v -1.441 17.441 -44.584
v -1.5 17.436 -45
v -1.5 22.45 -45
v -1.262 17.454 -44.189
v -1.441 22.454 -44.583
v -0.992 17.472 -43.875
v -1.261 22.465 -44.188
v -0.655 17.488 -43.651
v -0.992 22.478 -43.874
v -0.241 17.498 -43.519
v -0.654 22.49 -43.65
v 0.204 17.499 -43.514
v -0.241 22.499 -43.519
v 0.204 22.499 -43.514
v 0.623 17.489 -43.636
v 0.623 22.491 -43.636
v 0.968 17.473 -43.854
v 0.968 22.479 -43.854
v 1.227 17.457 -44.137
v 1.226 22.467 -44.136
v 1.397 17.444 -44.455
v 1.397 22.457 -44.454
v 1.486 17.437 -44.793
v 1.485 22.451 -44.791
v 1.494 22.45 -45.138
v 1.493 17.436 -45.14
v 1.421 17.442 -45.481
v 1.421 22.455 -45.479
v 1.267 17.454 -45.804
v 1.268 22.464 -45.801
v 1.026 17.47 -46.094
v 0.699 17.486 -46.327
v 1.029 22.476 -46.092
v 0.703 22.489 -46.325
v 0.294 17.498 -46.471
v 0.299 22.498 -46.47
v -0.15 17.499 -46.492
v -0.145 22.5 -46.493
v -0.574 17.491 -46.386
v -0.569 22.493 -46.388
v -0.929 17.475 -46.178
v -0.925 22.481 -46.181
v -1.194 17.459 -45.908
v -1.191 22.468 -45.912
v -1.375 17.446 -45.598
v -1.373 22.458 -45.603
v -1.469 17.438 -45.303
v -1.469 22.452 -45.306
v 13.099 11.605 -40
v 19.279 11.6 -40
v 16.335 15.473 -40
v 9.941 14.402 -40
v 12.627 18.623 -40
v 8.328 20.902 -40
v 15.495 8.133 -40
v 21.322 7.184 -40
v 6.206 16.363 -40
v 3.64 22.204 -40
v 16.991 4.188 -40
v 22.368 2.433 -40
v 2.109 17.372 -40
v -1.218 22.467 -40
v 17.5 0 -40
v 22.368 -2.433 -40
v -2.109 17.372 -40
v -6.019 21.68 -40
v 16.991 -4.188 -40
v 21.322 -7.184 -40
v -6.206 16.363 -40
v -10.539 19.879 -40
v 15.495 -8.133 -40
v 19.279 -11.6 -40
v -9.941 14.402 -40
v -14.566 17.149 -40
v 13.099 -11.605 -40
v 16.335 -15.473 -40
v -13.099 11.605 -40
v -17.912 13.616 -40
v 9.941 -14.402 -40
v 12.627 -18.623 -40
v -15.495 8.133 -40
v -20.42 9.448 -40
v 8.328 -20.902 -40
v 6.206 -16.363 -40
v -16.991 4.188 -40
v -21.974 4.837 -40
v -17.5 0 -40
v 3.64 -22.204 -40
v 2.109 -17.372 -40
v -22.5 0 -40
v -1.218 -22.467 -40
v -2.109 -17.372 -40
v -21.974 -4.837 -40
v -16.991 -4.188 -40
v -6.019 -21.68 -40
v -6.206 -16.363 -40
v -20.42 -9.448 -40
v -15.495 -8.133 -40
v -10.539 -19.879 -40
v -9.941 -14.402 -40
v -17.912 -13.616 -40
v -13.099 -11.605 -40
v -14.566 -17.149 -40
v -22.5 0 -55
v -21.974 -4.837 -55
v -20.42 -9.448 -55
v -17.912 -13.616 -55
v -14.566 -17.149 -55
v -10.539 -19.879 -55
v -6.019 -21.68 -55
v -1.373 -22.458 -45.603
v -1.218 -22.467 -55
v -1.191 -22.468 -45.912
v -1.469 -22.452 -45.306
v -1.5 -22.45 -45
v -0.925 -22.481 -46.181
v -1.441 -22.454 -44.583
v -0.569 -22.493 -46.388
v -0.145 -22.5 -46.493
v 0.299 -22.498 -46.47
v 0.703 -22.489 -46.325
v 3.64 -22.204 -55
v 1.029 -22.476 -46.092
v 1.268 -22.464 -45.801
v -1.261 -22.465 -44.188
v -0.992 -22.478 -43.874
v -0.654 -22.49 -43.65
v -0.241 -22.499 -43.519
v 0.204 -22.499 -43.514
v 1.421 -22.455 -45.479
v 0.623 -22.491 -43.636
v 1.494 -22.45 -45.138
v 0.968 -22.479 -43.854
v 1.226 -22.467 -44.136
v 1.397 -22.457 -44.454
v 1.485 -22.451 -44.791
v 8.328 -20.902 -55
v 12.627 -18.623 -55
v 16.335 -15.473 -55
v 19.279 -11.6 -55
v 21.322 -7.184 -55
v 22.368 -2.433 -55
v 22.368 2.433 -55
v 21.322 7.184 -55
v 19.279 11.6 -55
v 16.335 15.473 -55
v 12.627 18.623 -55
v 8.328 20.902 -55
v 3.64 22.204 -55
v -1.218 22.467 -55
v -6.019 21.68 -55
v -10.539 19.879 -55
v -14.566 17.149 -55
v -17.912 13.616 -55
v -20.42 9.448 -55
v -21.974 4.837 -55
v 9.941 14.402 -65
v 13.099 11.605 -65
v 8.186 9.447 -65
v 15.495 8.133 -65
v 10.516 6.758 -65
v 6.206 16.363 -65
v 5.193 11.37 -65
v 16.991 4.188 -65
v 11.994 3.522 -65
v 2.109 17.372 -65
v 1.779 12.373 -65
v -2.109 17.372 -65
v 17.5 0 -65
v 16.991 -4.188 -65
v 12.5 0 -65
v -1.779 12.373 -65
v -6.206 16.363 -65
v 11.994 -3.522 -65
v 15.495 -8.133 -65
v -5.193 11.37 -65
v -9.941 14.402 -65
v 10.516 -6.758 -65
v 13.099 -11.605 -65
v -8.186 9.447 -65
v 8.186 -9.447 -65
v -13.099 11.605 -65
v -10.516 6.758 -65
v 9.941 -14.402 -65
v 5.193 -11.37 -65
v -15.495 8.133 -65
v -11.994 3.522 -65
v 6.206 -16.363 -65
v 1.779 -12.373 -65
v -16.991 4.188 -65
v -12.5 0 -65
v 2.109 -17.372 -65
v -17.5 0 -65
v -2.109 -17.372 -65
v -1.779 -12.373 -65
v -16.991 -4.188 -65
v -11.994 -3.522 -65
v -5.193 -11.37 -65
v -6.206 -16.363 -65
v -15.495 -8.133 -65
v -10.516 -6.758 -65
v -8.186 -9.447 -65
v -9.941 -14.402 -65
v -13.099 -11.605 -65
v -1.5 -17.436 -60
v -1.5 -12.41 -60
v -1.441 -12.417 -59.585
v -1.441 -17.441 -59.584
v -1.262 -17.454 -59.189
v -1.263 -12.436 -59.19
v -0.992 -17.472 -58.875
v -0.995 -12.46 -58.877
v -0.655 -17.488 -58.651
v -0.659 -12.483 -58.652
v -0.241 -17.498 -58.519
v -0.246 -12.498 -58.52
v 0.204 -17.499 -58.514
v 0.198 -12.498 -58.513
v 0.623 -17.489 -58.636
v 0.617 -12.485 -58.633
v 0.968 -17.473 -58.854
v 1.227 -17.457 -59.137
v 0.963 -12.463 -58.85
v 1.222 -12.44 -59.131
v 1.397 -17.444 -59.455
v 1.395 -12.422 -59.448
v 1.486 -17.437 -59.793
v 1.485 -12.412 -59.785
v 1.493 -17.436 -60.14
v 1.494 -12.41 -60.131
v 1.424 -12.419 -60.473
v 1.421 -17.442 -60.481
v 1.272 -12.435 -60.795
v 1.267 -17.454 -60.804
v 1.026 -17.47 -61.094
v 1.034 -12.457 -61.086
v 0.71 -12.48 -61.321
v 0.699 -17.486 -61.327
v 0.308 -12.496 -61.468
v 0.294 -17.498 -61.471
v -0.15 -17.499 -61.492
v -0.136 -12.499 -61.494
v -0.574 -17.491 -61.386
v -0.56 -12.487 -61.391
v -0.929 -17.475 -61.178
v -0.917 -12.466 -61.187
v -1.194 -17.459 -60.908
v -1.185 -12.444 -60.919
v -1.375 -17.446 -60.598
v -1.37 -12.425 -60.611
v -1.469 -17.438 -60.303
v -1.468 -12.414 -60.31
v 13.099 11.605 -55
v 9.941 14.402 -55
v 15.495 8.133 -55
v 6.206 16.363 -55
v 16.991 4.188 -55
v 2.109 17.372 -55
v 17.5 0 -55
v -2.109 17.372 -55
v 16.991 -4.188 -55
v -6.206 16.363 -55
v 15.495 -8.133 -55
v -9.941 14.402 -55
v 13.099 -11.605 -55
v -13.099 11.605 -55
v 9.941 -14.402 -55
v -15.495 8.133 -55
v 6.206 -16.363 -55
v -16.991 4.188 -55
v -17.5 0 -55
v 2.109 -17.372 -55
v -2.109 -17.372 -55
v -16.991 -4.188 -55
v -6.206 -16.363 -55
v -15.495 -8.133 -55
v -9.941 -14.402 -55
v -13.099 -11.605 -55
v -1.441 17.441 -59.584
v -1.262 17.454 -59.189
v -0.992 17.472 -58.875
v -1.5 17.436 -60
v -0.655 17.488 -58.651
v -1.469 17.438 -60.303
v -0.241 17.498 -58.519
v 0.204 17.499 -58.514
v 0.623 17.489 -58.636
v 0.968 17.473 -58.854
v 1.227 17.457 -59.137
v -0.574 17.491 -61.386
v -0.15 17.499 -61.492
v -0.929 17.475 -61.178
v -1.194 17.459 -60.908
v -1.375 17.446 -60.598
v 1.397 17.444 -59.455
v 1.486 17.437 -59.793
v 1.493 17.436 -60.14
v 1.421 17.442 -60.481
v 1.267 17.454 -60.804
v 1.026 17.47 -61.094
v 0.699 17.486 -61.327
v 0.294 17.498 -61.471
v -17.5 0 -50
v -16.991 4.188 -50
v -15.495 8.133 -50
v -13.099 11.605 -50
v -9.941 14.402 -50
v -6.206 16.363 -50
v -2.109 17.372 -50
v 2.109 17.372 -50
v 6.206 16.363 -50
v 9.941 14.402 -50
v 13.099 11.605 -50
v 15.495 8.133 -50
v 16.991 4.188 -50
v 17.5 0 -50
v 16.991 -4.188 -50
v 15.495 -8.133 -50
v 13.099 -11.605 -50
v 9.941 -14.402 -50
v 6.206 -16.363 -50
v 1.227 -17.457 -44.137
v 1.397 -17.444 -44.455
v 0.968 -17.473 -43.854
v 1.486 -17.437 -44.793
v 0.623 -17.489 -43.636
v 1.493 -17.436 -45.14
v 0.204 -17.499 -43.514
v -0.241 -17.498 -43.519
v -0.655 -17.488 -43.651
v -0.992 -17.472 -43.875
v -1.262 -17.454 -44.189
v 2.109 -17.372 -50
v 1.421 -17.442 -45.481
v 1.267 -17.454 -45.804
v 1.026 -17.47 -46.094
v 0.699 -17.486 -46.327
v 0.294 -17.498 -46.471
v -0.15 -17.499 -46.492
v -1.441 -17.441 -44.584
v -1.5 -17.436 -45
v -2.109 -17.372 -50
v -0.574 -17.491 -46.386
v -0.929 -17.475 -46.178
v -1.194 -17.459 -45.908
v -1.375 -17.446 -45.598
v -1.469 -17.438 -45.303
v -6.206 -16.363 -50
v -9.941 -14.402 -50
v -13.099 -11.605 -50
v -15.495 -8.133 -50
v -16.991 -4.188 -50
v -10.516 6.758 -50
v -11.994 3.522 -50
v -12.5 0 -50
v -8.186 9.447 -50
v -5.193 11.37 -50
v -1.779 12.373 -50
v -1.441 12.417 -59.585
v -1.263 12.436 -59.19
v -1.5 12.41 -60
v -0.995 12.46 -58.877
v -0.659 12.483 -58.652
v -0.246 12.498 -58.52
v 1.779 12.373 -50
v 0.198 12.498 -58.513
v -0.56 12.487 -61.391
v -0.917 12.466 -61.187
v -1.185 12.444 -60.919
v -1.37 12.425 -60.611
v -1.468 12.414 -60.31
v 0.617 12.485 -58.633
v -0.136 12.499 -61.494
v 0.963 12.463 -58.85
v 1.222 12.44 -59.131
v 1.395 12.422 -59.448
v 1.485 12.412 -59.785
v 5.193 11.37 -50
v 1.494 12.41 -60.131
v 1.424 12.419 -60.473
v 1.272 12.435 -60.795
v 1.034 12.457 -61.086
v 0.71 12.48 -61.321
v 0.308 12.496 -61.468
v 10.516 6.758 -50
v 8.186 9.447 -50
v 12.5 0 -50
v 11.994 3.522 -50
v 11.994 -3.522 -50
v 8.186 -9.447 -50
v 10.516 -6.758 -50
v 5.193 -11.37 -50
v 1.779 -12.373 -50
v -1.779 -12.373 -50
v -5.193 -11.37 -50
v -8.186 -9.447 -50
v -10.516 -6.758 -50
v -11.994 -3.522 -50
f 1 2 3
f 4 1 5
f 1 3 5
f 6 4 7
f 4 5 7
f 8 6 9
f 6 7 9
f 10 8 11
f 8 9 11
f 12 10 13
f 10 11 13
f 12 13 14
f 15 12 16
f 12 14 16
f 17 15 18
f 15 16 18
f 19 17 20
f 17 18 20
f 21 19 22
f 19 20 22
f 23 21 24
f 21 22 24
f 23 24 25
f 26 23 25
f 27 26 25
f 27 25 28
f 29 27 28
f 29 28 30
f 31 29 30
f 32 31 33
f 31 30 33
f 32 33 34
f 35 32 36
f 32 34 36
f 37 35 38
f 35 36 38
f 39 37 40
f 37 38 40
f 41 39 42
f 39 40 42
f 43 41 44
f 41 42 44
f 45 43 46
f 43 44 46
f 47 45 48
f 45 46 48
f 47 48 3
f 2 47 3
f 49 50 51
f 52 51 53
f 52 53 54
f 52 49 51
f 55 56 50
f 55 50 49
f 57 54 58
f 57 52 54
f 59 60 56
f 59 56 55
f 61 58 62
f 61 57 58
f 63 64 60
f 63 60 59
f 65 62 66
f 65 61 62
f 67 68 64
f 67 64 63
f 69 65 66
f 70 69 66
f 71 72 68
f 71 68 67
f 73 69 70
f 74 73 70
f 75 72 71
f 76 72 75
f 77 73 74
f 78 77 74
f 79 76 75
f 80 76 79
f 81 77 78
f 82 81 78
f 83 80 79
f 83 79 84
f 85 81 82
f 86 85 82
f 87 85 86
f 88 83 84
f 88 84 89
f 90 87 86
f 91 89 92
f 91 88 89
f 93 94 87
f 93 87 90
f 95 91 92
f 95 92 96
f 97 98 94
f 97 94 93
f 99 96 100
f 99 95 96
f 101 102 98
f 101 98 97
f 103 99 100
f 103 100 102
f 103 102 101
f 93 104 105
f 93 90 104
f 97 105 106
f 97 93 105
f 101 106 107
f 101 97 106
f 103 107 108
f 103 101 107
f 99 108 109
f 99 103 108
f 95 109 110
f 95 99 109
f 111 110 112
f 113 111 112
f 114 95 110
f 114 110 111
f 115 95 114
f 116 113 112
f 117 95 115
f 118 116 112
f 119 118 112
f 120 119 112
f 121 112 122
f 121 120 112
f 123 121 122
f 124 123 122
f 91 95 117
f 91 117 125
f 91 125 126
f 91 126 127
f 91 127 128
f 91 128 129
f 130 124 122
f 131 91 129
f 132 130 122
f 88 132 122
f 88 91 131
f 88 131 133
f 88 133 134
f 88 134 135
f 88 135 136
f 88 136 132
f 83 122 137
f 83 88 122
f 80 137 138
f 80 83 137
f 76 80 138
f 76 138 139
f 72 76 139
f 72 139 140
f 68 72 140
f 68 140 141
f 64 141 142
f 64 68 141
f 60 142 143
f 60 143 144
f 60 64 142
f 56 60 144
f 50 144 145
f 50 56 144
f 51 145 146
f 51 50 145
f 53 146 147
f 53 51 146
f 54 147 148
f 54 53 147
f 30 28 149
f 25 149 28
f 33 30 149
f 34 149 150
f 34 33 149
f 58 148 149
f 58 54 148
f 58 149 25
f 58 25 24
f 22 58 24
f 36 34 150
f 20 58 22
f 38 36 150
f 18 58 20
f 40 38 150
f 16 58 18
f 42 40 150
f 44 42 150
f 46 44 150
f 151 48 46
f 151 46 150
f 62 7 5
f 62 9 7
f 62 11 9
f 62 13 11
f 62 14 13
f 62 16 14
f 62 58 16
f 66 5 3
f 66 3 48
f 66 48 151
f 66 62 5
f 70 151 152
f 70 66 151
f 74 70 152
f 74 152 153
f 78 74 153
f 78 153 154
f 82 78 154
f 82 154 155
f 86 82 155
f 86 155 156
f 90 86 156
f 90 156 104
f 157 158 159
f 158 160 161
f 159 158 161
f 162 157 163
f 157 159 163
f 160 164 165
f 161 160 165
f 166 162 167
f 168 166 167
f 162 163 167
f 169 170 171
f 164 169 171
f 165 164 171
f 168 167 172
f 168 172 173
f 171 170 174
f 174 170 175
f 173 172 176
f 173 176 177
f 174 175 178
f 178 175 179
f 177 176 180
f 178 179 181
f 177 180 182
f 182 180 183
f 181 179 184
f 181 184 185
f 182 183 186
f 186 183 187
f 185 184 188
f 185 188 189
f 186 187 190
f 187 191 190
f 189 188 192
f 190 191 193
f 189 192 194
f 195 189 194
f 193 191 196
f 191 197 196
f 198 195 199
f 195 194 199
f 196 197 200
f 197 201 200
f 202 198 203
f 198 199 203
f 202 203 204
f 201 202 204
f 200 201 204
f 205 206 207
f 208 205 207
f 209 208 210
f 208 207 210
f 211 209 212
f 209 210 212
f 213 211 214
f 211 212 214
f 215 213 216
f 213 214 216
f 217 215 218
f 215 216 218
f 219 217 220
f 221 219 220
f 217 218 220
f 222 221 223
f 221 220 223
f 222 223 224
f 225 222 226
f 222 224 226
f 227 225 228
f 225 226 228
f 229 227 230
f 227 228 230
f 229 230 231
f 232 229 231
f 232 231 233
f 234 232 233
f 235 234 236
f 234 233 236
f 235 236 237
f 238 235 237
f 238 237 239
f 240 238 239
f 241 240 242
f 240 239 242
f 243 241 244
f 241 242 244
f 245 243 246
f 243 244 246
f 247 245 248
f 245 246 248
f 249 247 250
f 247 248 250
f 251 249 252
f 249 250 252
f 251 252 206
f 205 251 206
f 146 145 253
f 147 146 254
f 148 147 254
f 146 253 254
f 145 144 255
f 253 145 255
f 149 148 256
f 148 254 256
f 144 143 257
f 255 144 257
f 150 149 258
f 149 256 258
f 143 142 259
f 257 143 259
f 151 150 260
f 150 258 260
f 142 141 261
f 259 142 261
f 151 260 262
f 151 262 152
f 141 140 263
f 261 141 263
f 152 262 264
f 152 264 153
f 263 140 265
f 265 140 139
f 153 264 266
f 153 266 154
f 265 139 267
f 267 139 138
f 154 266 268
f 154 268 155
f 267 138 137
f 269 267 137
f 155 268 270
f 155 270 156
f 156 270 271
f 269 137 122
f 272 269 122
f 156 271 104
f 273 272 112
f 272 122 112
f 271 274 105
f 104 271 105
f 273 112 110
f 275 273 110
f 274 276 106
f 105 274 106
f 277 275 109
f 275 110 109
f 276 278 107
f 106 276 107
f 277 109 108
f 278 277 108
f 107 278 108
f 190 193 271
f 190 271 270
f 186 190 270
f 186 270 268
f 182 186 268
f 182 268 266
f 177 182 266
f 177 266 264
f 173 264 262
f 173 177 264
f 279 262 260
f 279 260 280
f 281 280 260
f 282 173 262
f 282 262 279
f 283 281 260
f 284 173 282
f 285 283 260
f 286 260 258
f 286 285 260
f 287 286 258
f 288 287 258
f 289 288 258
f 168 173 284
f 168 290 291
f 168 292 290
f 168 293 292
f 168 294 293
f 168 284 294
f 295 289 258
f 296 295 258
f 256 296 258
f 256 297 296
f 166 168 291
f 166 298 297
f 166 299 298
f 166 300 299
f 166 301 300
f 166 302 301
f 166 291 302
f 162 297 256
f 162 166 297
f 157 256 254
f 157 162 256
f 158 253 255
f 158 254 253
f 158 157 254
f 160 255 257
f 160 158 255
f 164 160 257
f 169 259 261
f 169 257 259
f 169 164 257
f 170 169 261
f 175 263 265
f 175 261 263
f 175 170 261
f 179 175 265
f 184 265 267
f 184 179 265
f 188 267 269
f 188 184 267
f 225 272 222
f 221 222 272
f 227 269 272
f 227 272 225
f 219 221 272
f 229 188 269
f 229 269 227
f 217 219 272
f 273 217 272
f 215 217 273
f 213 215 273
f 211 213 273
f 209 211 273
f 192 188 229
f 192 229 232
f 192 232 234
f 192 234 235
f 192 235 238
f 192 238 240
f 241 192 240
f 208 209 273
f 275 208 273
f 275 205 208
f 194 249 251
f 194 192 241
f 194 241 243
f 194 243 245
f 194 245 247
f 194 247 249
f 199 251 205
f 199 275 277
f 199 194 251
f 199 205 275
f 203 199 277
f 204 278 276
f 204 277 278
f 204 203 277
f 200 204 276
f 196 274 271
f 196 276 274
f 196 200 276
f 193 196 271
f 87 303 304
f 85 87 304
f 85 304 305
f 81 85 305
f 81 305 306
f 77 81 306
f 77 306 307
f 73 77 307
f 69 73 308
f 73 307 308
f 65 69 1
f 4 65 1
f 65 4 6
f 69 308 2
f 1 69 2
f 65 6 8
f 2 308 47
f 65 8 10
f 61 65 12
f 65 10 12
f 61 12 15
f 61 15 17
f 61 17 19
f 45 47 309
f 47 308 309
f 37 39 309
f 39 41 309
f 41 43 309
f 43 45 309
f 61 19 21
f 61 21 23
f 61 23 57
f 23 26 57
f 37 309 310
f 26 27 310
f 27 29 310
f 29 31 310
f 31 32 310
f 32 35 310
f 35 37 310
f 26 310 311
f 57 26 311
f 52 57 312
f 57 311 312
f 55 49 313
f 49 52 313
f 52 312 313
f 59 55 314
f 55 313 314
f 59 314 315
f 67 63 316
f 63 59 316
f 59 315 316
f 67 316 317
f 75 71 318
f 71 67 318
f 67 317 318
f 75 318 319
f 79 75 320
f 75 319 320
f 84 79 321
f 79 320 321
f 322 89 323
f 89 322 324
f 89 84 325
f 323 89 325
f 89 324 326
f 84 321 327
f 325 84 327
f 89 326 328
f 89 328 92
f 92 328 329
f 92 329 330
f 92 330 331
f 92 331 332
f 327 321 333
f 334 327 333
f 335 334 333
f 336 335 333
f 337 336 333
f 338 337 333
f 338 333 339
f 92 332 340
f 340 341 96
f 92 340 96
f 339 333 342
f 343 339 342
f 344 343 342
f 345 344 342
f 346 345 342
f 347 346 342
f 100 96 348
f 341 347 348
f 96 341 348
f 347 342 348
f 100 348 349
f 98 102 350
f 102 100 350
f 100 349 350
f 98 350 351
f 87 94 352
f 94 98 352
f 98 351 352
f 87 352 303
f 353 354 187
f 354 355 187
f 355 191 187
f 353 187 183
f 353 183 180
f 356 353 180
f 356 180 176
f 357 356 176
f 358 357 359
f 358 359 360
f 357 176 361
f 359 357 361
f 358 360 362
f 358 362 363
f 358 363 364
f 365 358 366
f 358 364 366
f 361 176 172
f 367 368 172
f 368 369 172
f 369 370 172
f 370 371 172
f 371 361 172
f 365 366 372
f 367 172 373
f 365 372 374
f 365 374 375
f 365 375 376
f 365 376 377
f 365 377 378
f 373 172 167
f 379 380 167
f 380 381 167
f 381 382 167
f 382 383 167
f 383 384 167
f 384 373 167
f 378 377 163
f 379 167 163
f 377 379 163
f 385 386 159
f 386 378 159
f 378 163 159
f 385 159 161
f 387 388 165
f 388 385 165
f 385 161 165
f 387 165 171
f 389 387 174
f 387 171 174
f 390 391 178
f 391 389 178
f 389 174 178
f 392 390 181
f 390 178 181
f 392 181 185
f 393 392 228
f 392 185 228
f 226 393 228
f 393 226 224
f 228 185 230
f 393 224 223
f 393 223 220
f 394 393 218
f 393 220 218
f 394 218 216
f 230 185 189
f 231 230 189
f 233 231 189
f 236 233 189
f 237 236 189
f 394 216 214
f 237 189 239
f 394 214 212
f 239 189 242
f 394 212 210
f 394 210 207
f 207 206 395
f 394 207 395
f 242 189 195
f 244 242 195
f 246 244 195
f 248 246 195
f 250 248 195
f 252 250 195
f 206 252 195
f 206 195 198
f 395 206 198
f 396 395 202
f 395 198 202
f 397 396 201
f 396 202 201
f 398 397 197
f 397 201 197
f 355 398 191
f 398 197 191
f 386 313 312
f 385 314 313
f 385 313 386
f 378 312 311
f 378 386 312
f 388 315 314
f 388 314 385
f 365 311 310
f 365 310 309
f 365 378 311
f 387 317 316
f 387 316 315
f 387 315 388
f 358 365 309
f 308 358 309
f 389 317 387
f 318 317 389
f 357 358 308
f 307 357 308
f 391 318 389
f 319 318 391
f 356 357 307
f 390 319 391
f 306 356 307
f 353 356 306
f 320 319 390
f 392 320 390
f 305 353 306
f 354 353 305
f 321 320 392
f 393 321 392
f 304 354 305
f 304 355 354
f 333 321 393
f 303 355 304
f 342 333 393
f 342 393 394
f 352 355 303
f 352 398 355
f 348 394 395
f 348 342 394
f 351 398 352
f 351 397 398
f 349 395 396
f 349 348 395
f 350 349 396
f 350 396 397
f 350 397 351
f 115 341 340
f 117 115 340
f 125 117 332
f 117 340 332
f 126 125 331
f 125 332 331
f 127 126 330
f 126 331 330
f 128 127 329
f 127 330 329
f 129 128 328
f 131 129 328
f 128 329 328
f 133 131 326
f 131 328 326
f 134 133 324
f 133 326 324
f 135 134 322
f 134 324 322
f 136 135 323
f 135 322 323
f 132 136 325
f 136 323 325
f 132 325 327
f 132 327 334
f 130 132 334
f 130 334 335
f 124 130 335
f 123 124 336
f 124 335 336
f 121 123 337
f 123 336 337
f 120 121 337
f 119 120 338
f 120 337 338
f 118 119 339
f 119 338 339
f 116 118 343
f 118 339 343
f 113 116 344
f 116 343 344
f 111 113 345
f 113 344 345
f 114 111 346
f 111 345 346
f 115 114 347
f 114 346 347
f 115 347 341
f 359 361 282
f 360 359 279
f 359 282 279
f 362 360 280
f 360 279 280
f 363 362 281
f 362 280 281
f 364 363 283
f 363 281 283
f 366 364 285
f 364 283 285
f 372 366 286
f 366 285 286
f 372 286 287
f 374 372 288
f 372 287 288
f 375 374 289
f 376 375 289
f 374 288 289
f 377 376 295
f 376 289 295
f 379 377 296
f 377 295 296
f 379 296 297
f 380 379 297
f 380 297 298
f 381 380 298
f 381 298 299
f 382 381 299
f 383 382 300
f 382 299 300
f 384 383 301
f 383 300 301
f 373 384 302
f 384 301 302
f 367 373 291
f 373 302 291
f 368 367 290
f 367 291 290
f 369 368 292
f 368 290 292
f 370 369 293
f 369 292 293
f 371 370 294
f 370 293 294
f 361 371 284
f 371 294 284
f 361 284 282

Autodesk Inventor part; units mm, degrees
ref_plane "YZ Plane" through (0, 0, 0) normal (1, 0, 0) x (0, 1, 0)
ref_plane "XZ Plane" through (0, 0, 0) normal (0, 1, 0) x (-1, 0, 0)
ref_plane "XY Plane" through (0, 0, 0) normal (0, 0, 1) x (1, 0, 0)
sketch "Эскиз1" plane through (0, 0, 0) normal (0, 1, 0) x (-1, 0, 0)
  line L0 (17.5, -40) -> (17.5, -50)
  line L1 (17.5, -50) -> (12.5, -50)
  line L2 (12.5, -50) -> (12.5, -65)
  line L3 (12.5, -65) -> (17.5, -65)
  line L4 (22.5, -55) -> (22.5, -40)
  line L5 (22.5, -40) -> (17.5, -40)
  line L6 (12.5, -65) -> (17.5, -65)
  line L7 (22.5, -50) -> (22.5, -55)
  line L8 (22.5, -55) -> (17.5, -55)
  line L9 (17.5, -55) -> (17.5, -65)
  line L10 (12.5, -65) -> (0, -65)
  line L11 (0, -65) -> (0, -40)
  line L12 (17.5, -40) -> (0, -40)
  dimension "d21" = 10
  dimension "d22" = 15
  dimension "d23" = 5
  dimension "d24" = 5
  dimension "d26" = 12.5
  dimension "d39" = 17.5
  dimension "d40" = 5
revolve "Вращение1" add sketch "Эскиз1" angle 360 about axis through (0, 0, -65) along (0, 0, 1) contours L5 L4 L8 L9 L3 L2 L1 L0
sketch "Эскиз4" plane through (0, 0, 0) normal (0, 1, 0) x (-1, 0, 0)
  line L0 (12.5, -65) -> (-12.5, -65) projected
  line L1 (0, -65) -> (0, -60)
  line L2 (17.5, -40) -> (-17.5, -40) projected
  line L3 (0, -40) -> (0, -45)
  circle A0 centre (0, -60) radius 1.5
  circle A1 centre (0, -45) radius 1.5
  point P0 (0, 0)
  dimension "d27" = 5
  dimension "d28" = 5
  dimension "d29" = 3
  dimension "d30" = 3
extrude "Выдавливание3" cut sketch "Эскиз4" along normal blind 49.75 and the other way blind 43
thread "Резьба1" size "M3x0.5" class "6H" standard "ANSI Metric M Profile" full length
thread "Резьба2" size "M3x0.5" class "6H" standard "ANSI Metric M Profile" full length
properties part number "Муфта штурвал, вал 25"
